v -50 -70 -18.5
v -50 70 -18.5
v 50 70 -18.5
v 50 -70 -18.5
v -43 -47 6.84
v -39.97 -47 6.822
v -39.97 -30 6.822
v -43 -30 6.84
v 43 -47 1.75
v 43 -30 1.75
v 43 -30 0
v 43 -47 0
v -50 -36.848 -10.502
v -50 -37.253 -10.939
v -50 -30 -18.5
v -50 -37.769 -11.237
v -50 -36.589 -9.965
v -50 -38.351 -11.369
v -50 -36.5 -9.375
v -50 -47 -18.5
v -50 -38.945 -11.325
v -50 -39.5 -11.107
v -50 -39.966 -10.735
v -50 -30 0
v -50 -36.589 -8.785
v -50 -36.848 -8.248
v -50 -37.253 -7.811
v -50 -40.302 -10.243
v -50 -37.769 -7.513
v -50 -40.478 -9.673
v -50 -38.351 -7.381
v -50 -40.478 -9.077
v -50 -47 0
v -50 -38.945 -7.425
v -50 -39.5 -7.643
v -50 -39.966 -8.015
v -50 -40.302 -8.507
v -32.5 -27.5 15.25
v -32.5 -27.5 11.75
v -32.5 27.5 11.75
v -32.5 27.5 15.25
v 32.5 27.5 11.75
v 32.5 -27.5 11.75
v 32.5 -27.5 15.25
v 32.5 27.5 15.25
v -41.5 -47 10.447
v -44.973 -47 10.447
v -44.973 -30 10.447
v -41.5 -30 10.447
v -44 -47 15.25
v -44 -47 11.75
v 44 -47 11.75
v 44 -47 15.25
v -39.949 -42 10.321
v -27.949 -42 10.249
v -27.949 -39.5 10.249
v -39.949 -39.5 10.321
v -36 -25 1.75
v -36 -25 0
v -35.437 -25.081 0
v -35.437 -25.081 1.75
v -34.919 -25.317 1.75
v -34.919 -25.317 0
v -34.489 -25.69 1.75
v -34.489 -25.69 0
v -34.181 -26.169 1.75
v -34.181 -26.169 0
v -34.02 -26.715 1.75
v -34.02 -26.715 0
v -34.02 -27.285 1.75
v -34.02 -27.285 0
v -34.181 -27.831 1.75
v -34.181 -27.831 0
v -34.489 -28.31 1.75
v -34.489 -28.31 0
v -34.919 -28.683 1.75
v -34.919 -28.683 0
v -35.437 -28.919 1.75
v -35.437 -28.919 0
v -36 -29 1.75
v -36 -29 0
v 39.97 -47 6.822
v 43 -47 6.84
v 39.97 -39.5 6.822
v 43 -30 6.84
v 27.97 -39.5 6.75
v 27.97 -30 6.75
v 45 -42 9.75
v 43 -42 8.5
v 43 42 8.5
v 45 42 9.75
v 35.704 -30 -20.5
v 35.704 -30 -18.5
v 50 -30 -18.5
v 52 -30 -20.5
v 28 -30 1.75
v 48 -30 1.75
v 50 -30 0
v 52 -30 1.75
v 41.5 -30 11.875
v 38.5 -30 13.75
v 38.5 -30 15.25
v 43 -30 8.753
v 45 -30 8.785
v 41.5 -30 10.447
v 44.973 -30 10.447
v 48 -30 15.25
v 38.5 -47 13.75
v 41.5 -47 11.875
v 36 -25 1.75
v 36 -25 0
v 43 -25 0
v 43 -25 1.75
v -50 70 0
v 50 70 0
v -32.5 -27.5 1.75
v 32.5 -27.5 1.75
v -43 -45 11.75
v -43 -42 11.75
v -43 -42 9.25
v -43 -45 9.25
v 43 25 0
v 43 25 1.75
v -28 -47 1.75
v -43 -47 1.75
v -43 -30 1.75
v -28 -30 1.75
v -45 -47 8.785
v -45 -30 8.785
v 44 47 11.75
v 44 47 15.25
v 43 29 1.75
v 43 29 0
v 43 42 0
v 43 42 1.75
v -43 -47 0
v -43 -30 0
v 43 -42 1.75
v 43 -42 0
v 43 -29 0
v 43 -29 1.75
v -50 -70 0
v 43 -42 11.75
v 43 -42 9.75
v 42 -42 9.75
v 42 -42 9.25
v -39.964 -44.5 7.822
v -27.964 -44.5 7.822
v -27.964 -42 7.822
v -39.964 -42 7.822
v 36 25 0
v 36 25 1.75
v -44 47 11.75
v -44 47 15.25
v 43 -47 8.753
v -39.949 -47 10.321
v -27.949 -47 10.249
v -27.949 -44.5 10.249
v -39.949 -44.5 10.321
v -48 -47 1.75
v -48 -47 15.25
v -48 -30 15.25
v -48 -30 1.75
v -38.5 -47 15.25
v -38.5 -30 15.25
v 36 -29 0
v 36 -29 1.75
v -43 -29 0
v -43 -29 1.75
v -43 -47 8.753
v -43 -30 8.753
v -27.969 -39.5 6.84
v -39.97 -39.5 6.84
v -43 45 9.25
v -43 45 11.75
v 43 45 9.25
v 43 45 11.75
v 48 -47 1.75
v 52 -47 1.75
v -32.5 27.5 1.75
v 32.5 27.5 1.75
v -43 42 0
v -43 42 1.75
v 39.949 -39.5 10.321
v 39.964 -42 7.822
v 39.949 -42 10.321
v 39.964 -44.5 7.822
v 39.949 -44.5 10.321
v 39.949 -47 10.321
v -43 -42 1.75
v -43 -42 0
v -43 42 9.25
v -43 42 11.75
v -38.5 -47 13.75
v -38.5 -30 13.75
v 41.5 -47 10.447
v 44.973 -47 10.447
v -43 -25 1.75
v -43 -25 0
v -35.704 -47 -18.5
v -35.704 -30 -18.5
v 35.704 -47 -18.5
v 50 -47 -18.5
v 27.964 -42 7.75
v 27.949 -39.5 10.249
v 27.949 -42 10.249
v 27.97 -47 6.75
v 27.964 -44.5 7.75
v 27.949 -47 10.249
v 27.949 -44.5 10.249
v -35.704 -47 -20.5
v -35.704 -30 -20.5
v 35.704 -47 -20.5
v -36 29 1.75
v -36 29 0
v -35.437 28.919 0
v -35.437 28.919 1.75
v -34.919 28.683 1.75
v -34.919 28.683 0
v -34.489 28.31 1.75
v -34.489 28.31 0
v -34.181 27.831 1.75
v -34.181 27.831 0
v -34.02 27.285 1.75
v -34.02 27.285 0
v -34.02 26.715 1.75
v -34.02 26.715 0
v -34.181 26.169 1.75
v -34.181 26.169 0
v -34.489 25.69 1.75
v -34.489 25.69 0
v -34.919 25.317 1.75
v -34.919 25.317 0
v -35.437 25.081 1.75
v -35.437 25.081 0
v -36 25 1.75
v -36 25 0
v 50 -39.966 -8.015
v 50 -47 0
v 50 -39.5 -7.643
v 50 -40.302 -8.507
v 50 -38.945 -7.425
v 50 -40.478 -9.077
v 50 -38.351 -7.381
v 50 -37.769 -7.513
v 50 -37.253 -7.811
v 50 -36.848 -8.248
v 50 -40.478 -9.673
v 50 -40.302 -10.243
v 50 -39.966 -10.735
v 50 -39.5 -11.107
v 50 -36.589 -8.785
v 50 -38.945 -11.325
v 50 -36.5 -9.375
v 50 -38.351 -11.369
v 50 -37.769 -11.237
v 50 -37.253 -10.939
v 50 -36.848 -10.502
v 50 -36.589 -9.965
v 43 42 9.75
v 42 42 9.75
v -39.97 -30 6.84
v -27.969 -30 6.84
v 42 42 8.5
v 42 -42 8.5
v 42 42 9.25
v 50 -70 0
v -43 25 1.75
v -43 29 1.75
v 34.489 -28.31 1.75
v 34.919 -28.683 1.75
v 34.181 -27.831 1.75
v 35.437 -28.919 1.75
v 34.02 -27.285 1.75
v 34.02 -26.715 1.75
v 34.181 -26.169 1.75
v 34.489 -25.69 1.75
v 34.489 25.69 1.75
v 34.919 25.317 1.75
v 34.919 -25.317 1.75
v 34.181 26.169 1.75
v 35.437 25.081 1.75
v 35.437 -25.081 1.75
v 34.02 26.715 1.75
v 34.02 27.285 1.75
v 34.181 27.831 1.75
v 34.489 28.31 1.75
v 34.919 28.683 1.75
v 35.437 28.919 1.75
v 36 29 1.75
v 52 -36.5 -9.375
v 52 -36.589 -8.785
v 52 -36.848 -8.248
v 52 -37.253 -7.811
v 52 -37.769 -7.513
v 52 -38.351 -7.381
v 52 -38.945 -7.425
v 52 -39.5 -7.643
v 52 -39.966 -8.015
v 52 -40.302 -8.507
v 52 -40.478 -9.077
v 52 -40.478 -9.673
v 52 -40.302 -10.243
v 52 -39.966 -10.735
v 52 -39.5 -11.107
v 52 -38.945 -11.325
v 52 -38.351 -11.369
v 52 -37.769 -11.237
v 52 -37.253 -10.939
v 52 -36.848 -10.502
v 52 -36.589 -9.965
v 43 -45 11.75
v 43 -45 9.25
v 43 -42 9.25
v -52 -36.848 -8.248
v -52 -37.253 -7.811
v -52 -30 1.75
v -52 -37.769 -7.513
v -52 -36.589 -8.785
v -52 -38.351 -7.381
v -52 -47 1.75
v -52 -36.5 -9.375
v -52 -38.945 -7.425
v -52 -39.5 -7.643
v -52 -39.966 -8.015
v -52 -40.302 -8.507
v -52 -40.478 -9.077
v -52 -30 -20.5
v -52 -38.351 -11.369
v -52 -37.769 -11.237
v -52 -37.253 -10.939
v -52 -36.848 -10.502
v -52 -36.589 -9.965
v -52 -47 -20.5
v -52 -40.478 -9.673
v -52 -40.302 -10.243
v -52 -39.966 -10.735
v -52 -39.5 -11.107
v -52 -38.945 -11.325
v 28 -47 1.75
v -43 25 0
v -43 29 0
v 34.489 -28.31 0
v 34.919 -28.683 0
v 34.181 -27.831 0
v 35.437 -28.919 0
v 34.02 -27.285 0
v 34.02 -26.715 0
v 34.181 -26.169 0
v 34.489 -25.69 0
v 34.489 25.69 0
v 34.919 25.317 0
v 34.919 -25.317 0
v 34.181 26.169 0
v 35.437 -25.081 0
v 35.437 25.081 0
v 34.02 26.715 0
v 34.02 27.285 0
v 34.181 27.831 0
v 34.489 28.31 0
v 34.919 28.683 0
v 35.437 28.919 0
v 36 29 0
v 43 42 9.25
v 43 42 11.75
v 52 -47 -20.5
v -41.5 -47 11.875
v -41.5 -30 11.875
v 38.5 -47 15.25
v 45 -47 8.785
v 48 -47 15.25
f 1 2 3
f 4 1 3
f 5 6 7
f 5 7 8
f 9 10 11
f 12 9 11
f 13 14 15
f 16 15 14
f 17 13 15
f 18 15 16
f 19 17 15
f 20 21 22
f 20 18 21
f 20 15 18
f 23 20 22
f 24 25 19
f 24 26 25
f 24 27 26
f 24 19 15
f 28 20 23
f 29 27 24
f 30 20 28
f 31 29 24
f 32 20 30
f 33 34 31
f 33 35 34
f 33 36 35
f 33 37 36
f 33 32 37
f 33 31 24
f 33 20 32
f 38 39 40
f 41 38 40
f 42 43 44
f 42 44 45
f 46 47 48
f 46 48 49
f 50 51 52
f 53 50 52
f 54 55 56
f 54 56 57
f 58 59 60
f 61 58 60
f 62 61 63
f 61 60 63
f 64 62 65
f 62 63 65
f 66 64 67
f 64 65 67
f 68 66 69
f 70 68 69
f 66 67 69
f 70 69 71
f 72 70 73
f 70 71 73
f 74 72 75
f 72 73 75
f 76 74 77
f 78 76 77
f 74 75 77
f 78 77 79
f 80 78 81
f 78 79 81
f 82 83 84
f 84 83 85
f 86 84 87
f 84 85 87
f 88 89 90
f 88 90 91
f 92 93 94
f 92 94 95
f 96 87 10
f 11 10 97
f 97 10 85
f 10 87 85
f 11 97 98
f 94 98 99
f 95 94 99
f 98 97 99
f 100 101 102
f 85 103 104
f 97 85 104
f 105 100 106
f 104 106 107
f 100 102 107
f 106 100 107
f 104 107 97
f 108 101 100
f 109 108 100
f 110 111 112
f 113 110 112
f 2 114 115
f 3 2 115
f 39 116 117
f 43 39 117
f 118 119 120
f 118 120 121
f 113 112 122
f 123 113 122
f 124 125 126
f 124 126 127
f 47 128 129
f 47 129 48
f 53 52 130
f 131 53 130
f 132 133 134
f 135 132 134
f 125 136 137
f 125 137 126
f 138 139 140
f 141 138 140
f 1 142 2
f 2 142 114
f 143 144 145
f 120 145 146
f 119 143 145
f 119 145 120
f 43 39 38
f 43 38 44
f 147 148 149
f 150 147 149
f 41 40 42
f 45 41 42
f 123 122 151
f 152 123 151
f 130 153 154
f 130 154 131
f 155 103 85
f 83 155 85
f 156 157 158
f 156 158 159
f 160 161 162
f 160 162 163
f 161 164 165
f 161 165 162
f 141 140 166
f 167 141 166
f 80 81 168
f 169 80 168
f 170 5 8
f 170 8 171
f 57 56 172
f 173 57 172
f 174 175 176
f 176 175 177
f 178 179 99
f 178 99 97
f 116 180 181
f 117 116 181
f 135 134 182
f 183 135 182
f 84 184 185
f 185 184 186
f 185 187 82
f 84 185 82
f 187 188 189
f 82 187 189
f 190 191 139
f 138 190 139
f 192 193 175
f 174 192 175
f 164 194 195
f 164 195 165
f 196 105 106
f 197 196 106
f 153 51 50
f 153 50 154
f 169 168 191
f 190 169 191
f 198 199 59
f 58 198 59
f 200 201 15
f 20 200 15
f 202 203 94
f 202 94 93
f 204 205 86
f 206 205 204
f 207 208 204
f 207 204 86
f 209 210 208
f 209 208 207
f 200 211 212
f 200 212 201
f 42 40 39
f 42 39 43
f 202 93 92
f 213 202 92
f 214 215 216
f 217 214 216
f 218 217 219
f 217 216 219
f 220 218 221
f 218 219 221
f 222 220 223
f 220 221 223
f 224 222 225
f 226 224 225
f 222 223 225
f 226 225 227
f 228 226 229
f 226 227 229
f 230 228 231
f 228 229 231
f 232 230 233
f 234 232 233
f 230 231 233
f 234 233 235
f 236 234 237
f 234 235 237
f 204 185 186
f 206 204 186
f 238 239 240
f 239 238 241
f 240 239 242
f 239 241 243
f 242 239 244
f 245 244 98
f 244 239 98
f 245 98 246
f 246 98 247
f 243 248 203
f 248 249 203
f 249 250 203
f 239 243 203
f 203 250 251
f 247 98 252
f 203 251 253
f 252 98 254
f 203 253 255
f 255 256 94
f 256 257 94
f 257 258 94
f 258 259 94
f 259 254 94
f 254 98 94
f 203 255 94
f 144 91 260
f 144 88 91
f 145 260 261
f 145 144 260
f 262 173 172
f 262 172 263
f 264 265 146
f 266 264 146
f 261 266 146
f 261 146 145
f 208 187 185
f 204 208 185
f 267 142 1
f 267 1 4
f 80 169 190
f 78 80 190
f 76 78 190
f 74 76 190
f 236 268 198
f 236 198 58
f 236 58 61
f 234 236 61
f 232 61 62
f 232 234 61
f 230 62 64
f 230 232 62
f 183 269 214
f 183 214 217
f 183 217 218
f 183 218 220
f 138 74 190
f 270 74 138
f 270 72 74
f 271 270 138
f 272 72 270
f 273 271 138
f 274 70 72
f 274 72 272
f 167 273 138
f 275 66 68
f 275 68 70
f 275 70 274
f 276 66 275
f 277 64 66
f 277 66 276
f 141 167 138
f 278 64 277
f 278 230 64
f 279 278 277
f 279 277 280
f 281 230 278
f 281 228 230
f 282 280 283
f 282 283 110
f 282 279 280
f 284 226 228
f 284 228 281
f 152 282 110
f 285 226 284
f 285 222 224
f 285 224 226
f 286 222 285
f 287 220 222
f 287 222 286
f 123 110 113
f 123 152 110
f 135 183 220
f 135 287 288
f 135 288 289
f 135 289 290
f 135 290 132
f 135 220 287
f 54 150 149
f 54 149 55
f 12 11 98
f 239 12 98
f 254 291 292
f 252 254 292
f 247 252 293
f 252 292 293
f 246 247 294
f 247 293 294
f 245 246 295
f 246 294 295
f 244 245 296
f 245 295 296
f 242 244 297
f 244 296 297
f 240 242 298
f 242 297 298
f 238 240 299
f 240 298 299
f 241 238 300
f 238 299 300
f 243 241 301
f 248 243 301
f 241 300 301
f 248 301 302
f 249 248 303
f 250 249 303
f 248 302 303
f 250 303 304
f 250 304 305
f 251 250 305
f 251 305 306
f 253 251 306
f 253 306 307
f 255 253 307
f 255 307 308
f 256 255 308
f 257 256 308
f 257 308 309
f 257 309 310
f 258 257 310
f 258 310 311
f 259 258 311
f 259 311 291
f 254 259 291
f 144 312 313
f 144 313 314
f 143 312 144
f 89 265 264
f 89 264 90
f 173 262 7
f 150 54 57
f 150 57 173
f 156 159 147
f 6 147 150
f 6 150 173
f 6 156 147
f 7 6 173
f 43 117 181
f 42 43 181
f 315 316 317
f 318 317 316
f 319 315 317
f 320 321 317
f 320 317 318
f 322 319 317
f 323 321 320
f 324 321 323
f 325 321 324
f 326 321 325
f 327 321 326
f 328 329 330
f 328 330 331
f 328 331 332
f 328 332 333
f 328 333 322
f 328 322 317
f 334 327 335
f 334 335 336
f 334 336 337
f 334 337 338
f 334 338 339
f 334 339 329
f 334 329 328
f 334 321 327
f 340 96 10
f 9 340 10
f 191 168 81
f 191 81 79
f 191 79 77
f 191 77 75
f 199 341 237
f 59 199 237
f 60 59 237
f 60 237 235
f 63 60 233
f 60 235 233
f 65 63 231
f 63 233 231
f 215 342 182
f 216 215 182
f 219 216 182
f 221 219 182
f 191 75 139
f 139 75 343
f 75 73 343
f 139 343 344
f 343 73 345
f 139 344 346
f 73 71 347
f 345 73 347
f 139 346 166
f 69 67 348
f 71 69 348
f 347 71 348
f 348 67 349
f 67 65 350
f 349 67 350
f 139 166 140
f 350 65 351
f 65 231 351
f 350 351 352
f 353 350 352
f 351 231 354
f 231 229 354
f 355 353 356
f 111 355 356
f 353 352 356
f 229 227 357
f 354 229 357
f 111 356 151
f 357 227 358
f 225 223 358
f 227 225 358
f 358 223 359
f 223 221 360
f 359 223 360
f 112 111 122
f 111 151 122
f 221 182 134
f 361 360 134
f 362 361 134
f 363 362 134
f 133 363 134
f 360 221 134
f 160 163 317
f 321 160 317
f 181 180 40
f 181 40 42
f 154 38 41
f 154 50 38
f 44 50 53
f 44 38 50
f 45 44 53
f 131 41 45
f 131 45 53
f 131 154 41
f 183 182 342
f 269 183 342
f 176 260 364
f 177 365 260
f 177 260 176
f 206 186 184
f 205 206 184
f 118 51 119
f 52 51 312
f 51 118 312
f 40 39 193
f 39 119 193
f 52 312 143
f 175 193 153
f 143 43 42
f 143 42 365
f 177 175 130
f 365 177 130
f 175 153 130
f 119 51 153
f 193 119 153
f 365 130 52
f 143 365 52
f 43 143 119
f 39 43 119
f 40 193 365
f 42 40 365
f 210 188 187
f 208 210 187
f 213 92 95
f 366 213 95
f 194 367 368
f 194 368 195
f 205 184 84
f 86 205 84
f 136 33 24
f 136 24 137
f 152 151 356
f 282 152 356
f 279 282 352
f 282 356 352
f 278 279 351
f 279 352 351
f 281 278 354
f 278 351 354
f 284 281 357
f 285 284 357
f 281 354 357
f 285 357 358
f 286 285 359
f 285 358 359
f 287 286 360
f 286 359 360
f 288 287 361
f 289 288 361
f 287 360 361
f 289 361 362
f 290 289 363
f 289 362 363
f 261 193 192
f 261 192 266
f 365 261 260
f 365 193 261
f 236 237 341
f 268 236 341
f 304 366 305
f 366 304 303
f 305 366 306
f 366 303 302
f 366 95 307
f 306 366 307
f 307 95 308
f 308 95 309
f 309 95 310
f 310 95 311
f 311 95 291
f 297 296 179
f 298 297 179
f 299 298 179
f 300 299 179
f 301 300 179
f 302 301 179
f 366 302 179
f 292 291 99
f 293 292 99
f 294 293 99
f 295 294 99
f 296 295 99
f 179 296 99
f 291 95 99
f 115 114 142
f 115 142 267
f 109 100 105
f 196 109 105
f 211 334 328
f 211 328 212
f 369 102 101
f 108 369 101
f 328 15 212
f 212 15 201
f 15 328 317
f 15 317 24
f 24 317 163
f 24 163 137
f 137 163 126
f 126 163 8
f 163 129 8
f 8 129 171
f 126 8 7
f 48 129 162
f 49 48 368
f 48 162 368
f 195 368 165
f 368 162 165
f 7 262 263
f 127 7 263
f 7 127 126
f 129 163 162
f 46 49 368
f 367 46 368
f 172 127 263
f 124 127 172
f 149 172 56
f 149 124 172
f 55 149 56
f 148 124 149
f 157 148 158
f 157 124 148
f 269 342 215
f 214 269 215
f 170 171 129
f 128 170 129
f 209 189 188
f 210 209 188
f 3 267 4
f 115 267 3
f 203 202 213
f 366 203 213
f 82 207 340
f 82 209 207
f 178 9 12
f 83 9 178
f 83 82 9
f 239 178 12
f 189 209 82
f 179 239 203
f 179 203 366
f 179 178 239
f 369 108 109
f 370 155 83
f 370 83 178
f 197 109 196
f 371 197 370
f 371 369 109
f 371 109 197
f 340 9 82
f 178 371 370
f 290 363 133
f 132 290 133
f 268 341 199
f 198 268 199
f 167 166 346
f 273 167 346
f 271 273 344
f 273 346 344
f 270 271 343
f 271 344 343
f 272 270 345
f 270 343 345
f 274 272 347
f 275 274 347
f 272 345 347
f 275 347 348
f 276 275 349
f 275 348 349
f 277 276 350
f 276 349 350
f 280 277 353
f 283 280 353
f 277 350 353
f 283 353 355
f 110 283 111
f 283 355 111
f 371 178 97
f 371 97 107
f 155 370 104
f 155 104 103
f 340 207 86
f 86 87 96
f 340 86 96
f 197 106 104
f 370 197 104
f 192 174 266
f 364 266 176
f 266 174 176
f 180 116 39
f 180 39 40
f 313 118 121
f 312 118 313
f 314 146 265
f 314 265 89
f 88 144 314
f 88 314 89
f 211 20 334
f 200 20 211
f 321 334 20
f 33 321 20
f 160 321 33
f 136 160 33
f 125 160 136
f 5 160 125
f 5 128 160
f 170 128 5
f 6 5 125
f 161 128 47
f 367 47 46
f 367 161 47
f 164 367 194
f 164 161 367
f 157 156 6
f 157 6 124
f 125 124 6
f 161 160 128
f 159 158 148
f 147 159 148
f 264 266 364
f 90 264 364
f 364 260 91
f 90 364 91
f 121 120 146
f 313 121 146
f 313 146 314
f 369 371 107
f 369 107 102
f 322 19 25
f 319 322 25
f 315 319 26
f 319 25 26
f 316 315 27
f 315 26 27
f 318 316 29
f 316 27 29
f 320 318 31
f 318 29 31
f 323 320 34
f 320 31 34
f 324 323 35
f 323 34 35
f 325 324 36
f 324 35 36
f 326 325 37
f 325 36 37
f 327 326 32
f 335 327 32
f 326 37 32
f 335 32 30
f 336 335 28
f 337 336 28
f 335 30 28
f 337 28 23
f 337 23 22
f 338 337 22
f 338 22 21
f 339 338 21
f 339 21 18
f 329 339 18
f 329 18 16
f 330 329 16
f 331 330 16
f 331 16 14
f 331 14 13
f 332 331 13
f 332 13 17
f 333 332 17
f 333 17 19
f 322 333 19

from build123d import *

# Parameters (mm, degrees)
F0_W           = 100
F0_H           = 140
F1_DEPTH       = 18.5
F3_DEPTH       = 1.75
F4_W           = 65
F4_H           = 55
F5_DEPTH       = 10
F6_W           = 88
F6_H           = 94
F6_W_2         = 86
F6_H_2         = 84
F6_W_3         = 65
F6_H_3         = 55
F6_H_4         = 3
F7_DEPTH       = 3.5
F8_DEPTH       = 2.5
F9_W           = 1
F9_H           = 1.25
F10_DEPTH      = 42
F10_DEPTH_BACK = 42
F12_DEPTH      = 47
F13_DEPTH      = 30
F15_DEPTH      = 12
F17_DEPTH      = 17
F19_DEPTH      = 40
F20_R          = 2
F21_DEPTH      = 120


with BuildPart() as f1:
    # F0 (on Top) → F1 (new body)
    with BuildSketch(Plane.XY):
        Rectangle(F0_W, F0_H)
    extrude(amount=-F1_DEPTH)


with BuildPart() as f3:
    # F2 (on Top) → F3 (new body)
    with BuildSketch(Plane.XY):
        with BuildLine():
            Line((43, 42), (-43, 42))
            Line((-43, 42), (-43, 29))
            Line((-43, 29), (-36, 29))
            ThreePointArc((-36, 29), (-34, 27), (-36, 25))
            Line((-36, 25), (-43, 25))
            Line((-43, 25), (-43, -25))
            Line((-43, -25), (-36, -25))
            ThreePointArc((-36, -25), (-34, -27), (-36, -29))
            Line((-36, -29), (-43, -29))
            Line((-43, -29), (-43, -42))
            Line((-43, -42), (43, -42))
            Line((43, -42), (43, -29))
            Line((43, -29), (36, -29))
            ThreePointArc((36, -29), (34, -27), (36, -25))
            Line((36, -25), (43, -25))
            Line((43, -25), (43, 25))
            Line((43, 25), (36, 25))
            ThreePointArc((36, 25), (34, 27), (36, 29))
            Line((36, 29), (43, 29))
            Line((43, 29), (43, 42))
        make_face()
    extrude(amount=F3_DEPTH)


with BuildPart() as f5:
    # F4 (on face) → F5 (new body)
    with BuildSketch(Plane.XY.offset(1.75)):
        Rectangle(F4_W, F4_H)
    extrude(amount=F5_DEPTH)


with BuildPart() as f7:
    # F6 (on face) → F7 (new body)
    with BuildSketch(Plane.XY.offset(11.75)):
        Rectangle(F6_W, F6_H)
        Polygon((-43, 42), (-43, 45), (43, 45), (43, 42), (43, -42), (43, -44), (43, -45), (-43, -45), (-43, -44), (-43, -42), align=None, mode=Mode.SUBTRACT)
        Rectangle(F6_W_2, F6_H_2)
        Rectangle(F6_W_3, F6_H_3, mode=Mode.SUBTRACT)
        with Locations((0, 43.5)):
            Rectangle(F6_W_2, F6_H_4)
        Polygon((43, -42), (-43, -42), (-43, -44), (-43, -45), (43, -45), (43, -44), align=None)
    extrude(amount=F7_DEPTH)

    # F6 (on face) → F8 (join)
    with BuildSketch(Plane.XY.offset(11.75)):
        with Locations((0, 43.5)):
            Rectangle(F6_W_2, F6_H_4)
        Polygon((43, -42), (-43, -42), (-43, -44), (-43, -45), (43, -45), (43, -44), align=None)
    extrude(amount=-F8_DEPTH)

    # F9 (on Front) → F10 (join, two sides)
    with BuildSketch(Plane.XZ) as f10_sk:
        with Locations((42.5, 9.125)):
            Rectangle(F9_W, F9_H)
        Polygon((43, 9.75), (43, 8.5), (45, 9.75), align=None)
    extrude(amount=F10_DEPTH)
    extrude(f10_sk.sketch, amount=-F10_DEPTH_BACK)


with BuildPart() as f12:
    # F11 (on Front) → F12 (new body)
    with BuildSketch(Plane.XZ):
        Polygon((27.9699712028, 6.7499098263), (28, 1.75), (43, 1.75), (43, 0), (48, 0), (50, 0), (52, 0), (52, 1.75), (48, 1.75), (48, 13.75), (48, 15.25), (38.5, 15.25), (38.5, 13.75), (41.5, 11.875), (41.5, 10.4472711682), (44.9731051922, 10.4472711682), (45, 8.7854899466), (43, 8.7531212961), (43, 6.8401781918), align=None)
        Polygon((52, 0), (50, 0), (50, -18.5), (35.7036739588, -18.5), (35.7036739588, -20.5), (52, -20.5), align=None)
    extrude(amount=F12_DEPTH)

    # F11 (on Front) → F13 (cut)
    with BuildSketch(Plane.XZ):
        Polygon((27.9699712028, 6.7499098263), (28, 1.75), (43, 1.75), (43, 0), (48, 0), (50, 0), (52, 0), (52, 1.75), (48, 1.75), (48, 13.75), (48, 15.25), (38.5, 15.25), (38.5, 13.75), (41.5, 11.875), (41.5, 10.4472711682), (44.9731051922, 10.4472711682), (45, 8.7854899466), (43, 8.7531212961), (43, 6.8401781918), align=None)
        Polygon((52, 0), (50, 0), (50, -18.5), (35.7036739588, -18.5), (35.7036739588, -20.5), (52, -20.5), align=None)
    extrude(amount=F13_DEPTH, mode=Mode.SUBTRACT)

    # F14 (on face) → F15 (join)
    with BuildSketch(Plane(origin=(28.0094999534, 0, 0.1682213529), x_dir=(0, -1, 0), z_dir=(-0.9999819653, 0, -0.0060057594))):
        Polygon((39.5, 5.9370710514), (47, 5.9370710514), (47, 7.0816674463), (47, 10.0810629427), (44.5, 10.0810629427), (44.5, 7.5816674463), (42, 7.5816674463), (42, 9.5810629427), (42, 10.0810629427), (39.5, 10.0810629427), (39.5, 9.5810629427), align=None)
    extrude(amount=-F15_DEPTH)


with BuildPart() as f17:
    # F16 (on face) → F17 (new body)
    with BuildSketch(Plane.XZ.offset(47)):
        Polygon((-35.7036739588, -20.5), (-35.7036739588, -18.5), (-50, -18.5), (-50, 0), (-43, 0), (-43, 1.75), (-28, 1.75), (-27.9489555144, 10.2491024863), (-39.9487390975, 10.3211715997), (-39.9697547859, 6.8219789397), (-43, 6.8401781918), (-43, 8.7531212961), (-45, 8.7854899466), (-44.9731051922, 10.4472711682), (-41.5, 10.4472711682), (-41.5, 11.875), (-38.5, 13.75), (-38.5, 15.25), (-48, 15.25), (-48, 1.75), (-52, 1.75), (-52, -20.5), align=None)
    extrude(amount=-F17_DEPTH)

    # F18 (on Right) → F19 (cut)
    with BuildSketch(Plane.YZ):
        Polygon((-39.5, 10.4472711682), (-39.5, 10.2491024863), (-39.5, 6.8401781918), (-30, 6.8401781918), (-30, 10.2491024863), (-30, 10.4472711682), align=None)
        Polygon((-44.5, 10.4472711682), (-44.5, 10.2491024863), (-44.5, 7.8218211792), (-42, 7.8218211792), (-42, 10.2491024863), (-42, 10.4472711682), align=None)
    extrude(amount=-F19_DEPTH, mode=Mode.SUBTRACT)


with BuildPart() as f21_tool:
    # F20 (on face) → F21 (new body)
    with BuildSketch(Plane.YZ.offset(52)):
        with Locations((-38.5, -9.375)):
            Circle(F20_R)
    extrude(amount=-F21_DEPTH)


with BuildPart() as f12_1:
    add(f12.part)

    # F21: cut by f21_tool
    add(f21_tool.part, mode=Mode.SUBTRACT)


with BuildPart() as f17_1:
    add(f17.part)

    # F21: cut by f21_tool
    add(f21_tool.part, mode=Mode.SUBTRACT)


solid = Compound([f1.part, f3.part, f5.part, f7.part, f12_1.part, f17_1.part])
